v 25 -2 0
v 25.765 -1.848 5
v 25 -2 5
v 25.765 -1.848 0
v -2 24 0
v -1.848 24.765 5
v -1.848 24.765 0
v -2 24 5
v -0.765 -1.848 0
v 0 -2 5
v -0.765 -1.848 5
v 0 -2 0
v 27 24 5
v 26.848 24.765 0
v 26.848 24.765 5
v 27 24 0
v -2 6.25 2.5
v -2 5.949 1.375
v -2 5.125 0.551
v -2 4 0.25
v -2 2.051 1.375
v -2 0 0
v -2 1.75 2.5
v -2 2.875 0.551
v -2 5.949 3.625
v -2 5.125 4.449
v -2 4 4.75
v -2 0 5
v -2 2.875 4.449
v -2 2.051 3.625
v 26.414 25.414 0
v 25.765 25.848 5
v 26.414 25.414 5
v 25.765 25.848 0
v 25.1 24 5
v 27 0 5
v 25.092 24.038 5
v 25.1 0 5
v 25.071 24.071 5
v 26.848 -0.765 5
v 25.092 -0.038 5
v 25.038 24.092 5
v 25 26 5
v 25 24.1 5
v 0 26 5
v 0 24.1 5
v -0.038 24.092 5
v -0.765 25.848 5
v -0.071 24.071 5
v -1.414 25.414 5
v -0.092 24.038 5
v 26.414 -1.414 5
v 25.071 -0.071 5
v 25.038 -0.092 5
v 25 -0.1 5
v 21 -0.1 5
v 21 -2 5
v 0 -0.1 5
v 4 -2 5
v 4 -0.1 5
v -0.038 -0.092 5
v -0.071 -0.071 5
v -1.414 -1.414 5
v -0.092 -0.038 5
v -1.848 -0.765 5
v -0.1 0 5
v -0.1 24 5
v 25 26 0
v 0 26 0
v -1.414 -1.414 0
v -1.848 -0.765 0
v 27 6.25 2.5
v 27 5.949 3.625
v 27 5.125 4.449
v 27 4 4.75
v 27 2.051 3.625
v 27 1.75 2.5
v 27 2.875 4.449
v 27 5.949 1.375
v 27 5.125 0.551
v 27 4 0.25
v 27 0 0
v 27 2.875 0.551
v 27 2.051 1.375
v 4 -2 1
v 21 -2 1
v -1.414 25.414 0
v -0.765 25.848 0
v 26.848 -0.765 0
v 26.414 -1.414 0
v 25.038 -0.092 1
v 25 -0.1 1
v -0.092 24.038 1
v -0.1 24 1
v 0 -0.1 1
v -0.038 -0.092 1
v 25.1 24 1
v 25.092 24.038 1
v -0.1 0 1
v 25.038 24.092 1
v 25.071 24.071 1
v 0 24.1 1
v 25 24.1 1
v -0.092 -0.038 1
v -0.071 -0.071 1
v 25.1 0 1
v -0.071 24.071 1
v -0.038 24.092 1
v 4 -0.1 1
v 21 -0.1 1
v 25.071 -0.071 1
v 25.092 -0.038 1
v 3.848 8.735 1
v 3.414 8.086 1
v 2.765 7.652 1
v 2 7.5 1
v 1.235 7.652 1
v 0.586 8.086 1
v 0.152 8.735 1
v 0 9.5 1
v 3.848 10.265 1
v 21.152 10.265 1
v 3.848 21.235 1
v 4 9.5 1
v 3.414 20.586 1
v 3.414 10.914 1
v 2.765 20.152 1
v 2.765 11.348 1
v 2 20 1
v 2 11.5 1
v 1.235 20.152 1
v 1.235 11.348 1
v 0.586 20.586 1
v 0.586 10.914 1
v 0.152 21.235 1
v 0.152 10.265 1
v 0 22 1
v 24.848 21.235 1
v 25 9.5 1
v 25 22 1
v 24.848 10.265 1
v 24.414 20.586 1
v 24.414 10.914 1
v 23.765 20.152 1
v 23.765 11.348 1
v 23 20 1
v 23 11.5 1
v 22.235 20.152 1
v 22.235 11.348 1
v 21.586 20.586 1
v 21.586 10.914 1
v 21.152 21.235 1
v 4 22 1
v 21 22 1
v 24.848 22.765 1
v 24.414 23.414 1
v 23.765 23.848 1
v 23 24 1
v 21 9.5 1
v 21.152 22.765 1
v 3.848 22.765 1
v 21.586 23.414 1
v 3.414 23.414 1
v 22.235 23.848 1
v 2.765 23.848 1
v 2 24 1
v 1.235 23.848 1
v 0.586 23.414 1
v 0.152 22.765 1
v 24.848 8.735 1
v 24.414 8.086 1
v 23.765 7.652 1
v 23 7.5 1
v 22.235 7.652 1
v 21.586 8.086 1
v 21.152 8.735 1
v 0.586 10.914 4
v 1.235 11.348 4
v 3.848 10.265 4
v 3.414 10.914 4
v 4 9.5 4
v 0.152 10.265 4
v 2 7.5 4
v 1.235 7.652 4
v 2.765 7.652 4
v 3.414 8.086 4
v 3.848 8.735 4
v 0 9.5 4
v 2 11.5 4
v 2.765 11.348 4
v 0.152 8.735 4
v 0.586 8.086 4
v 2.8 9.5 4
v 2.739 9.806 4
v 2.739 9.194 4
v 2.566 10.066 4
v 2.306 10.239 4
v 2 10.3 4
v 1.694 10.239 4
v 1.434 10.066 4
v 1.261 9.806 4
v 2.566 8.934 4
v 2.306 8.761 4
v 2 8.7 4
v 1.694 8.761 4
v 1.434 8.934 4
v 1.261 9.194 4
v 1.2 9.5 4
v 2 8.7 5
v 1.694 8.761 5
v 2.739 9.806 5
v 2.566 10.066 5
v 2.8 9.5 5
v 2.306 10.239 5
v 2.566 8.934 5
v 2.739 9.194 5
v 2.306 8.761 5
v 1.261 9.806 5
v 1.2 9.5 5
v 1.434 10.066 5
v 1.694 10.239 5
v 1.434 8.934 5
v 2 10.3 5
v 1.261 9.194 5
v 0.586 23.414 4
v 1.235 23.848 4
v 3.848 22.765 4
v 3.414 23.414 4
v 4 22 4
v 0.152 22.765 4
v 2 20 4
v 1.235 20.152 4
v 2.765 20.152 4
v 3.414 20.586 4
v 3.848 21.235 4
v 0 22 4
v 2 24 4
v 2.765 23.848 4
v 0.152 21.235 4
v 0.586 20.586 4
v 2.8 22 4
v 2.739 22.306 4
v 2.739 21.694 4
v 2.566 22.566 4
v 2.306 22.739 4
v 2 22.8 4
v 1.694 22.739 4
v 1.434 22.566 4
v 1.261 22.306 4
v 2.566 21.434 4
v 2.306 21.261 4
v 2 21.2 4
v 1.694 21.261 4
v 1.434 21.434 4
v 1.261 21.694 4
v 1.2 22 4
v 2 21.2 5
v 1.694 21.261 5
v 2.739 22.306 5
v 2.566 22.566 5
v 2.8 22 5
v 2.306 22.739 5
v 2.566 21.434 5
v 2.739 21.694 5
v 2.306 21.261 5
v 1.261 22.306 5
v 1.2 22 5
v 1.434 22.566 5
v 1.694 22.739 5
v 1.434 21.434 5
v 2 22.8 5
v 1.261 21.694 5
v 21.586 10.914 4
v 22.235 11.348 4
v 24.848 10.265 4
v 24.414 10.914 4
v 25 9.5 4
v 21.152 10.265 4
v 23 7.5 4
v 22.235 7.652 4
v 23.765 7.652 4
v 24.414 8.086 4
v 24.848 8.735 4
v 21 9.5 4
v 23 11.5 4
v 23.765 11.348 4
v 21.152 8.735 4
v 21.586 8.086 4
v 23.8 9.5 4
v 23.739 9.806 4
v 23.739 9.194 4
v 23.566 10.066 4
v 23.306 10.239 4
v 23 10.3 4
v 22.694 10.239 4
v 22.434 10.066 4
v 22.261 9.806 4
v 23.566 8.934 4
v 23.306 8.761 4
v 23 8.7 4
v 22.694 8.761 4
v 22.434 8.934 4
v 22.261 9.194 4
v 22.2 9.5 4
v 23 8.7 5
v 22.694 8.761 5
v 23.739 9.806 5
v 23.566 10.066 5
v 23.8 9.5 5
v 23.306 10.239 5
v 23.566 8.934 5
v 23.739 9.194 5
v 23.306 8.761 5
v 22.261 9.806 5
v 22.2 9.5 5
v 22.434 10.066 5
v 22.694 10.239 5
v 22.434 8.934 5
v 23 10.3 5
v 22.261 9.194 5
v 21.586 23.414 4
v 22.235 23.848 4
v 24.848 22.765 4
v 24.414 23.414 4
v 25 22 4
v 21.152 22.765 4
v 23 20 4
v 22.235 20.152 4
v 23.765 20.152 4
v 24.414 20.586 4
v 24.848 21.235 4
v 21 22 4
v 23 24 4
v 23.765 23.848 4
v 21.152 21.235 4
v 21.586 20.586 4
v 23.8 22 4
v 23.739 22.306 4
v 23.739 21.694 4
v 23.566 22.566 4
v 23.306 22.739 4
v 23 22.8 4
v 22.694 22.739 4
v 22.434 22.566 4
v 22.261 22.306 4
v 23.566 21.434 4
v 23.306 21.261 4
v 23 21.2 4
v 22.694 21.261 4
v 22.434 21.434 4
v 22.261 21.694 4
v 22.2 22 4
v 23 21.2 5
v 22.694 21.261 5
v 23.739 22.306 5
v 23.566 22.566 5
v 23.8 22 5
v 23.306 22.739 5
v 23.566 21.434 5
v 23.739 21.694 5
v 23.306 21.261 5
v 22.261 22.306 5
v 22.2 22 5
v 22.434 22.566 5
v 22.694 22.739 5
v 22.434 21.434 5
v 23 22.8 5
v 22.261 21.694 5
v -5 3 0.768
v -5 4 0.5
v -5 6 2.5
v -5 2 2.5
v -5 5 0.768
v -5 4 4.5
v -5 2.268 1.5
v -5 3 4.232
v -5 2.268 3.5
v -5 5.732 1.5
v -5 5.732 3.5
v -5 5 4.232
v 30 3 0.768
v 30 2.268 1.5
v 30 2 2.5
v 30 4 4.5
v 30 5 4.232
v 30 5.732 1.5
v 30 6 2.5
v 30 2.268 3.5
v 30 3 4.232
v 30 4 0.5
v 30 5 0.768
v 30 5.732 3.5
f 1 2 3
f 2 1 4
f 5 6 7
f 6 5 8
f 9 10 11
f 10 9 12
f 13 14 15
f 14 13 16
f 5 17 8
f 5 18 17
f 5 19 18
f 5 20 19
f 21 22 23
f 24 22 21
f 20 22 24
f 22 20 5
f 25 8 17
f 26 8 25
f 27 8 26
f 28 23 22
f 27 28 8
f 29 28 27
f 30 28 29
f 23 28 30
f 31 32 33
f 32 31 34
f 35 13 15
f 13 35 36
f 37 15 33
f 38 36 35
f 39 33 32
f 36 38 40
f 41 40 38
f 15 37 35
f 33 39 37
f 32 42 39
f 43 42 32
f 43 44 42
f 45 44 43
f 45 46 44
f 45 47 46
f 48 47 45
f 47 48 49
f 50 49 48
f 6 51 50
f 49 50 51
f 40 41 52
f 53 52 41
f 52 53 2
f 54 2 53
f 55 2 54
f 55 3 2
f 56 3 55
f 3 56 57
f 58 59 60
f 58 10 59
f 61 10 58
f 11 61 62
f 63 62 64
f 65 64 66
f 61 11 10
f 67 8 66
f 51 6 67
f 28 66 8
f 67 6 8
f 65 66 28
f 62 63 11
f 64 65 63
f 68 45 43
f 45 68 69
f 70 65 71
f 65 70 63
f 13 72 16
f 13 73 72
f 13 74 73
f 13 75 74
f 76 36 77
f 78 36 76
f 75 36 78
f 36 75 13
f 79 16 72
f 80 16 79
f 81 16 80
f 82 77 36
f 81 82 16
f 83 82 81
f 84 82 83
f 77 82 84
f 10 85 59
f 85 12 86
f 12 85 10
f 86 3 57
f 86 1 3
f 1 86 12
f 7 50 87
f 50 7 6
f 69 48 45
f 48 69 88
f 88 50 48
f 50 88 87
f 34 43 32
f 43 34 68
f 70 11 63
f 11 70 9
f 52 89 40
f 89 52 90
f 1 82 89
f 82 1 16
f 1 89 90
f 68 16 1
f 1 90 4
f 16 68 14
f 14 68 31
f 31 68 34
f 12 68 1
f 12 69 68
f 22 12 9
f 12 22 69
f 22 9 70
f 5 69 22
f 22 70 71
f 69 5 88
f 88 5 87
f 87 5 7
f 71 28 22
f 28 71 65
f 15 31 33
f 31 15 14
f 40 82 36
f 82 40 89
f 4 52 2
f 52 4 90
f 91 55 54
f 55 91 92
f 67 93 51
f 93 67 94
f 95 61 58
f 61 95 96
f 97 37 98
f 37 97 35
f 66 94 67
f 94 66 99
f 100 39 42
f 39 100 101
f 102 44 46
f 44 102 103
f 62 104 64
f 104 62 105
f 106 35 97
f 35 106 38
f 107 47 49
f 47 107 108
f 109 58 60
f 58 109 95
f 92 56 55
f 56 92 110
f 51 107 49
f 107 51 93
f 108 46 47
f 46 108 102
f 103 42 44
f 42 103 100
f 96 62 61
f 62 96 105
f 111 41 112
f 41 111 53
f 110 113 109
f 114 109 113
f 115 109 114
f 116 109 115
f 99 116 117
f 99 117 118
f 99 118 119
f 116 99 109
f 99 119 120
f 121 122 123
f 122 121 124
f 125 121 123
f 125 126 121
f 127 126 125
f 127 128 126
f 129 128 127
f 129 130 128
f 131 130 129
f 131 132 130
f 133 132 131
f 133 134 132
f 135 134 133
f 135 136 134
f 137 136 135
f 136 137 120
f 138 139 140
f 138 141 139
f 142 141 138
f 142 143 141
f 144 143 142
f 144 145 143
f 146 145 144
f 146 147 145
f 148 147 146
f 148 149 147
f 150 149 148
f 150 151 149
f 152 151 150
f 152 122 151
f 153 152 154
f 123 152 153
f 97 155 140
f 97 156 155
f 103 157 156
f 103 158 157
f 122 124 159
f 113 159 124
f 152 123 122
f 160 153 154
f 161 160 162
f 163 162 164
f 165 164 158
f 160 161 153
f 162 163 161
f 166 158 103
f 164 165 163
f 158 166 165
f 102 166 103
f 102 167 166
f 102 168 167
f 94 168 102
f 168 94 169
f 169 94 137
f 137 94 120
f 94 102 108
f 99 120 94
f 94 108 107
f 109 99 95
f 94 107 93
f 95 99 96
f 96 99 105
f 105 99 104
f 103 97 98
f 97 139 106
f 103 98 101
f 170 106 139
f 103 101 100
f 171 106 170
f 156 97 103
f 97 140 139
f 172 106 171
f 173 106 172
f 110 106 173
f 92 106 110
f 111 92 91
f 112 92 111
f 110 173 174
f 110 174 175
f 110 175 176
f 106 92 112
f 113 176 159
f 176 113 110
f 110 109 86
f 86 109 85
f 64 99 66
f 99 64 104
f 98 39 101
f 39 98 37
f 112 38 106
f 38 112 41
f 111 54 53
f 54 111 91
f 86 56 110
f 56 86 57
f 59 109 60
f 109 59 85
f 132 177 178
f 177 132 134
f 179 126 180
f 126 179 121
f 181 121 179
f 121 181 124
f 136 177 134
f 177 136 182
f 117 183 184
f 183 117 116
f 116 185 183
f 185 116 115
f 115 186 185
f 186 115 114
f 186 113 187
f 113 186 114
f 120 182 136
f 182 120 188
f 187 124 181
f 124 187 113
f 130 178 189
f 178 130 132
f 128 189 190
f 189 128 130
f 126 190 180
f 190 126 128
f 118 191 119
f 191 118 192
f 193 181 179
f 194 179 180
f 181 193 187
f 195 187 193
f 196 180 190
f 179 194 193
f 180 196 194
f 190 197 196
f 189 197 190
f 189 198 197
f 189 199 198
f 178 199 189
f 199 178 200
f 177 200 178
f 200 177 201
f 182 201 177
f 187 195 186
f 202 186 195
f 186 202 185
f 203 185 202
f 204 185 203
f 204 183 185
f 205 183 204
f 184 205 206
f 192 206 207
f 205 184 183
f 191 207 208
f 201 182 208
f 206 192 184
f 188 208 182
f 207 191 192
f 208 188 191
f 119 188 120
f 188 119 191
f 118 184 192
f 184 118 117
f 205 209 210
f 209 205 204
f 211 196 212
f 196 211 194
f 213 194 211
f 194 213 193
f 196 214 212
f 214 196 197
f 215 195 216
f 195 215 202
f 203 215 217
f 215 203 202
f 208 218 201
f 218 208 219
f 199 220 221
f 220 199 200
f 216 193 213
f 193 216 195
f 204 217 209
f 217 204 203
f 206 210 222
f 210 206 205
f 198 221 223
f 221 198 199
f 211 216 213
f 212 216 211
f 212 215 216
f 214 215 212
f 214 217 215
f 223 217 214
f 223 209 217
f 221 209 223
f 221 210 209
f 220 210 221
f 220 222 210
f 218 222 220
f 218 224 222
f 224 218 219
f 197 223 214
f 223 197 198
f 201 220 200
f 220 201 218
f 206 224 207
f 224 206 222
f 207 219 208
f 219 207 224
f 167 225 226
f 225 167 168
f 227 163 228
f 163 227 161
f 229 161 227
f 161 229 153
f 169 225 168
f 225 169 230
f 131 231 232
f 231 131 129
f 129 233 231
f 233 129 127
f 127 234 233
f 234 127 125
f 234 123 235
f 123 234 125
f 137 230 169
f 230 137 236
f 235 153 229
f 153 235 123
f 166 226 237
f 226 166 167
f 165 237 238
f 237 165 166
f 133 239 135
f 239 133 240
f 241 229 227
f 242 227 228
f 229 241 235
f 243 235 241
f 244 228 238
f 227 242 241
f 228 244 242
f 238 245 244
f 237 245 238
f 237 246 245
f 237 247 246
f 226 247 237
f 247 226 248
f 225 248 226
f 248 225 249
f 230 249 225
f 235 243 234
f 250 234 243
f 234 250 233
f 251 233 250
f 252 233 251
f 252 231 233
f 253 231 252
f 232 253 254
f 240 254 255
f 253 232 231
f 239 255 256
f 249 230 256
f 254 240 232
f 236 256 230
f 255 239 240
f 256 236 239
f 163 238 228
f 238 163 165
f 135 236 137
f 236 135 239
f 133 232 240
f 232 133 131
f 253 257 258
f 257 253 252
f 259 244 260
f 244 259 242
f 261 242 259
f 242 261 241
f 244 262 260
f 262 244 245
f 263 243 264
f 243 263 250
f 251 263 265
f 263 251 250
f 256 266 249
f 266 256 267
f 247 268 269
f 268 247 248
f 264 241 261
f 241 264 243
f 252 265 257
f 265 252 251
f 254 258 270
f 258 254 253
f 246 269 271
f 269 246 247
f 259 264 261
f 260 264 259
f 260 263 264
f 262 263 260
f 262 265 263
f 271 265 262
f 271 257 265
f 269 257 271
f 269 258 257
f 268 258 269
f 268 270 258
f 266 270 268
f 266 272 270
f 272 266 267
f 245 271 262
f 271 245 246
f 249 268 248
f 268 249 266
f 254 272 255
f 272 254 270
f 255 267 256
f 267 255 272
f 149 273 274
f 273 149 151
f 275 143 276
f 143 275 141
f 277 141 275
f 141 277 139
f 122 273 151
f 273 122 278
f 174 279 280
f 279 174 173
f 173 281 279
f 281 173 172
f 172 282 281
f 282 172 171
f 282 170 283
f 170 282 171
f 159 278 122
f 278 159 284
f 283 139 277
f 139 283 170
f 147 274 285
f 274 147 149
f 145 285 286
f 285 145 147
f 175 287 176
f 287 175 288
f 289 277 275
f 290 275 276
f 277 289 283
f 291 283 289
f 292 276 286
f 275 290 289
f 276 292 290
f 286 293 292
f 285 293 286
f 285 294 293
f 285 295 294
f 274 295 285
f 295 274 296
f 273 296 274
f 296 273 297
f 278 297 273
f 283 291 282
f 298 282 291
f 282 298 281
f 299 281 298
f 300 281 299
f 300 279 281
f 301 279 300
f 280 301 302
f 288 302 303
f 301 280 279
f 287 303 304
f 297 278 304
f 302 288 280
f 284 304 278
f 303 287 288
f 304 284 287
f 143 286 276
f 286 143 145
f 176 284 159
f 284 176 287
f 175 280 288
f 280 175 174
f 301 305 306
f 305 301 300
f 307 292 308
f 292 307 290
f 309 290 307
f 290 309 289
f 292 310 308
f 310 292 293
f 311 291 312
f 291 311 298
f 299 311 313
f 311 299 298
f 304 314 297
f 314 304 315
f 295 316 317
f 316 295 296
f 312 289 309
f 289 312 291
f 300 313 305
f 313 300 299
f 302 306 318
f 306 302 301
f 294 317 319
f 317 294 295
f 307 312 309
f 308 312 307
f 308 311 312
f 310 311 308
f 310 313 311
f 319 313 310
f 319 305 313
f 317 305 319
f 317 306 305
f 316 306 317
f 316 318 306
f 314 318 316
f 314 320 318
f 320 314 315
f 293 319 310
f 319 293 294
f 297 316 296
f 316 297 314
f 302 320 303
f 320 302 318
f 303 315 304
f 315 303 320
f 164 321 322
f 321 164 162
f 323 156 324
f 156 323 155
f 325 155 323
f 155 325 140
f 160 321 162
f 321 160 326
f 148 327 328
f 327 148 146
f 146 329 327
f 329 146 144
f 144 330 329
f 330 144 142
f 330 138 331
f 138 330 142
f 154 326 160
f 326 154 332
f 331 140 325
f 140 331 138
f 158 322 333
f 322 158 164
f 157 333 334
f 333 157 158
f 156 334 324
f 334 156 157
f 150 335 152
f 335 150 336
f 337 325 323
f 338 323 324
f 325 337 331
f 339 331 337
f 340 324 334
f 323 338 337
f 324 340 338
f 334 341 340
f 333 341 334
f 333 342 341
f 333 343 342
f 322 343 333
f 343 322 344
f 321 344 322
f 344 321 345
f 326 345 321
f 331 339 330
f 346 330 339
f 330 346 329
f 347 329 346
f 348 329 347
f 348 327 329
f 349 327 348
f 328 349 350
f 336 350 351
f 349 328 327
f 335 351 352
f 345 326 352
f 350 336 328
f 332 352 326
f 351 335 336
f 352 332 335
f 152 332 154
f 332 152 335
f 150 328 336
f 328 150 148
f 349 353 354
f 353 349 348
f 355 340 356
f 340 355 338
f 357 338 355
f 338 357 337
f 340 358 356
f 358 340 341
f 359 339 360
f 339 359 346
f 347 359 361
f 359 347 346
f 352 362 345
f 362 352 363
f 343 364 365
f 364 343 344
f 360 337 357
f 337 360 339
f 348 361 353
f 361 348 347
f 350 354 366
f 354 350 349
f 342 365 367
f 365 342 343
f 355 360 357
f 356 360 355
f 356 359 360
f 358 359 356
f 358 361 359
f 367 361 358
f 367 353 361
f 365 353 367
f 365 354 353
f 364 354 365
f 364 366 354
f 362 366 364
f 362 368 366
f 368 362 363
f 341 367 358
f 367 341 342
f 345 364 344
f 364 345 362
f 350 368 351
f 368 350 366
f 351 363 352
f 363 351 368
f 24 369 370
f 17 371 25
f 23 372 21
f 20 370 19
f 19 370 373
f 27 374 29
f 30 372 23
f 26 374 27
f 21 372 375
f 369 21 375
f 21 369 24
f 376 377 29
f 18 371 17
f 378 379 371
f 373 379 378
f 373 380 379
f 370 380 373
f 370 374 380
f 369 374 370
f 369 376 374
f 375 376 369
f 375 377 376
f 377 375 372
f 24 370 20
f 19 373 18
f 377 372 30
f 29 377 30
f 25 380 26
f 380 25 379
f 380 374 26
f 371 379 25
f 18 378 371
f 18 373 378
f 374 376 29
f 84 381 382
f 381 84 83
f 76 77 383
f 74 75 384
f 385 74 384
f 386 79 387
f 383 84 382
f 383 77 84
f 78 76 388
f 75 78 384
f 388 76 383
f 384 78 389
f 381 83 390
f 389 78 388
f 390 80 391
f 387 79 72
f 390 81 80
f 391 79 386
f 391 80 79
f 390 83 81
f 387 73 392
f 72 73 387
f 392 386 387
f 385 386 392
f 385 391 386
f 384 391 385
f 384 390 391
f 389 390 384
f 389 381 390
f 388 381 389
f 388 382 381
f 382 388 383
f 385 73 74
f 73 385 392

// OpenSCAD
// Mcam1a.scad
// This is the back for the camera



module shell(){
    
// main shell
difference(){
    color("yellow")
    linear_extrude(height=5)
    offset(r=2,$fn=16)    
    square(size=[25,24]);

    translate([0,0,1])
    color("orange")
    linear_extrude(height=5)
    offset(r=0.1,$fn=16)    
    square(size=[25,24]);

    translate([4,-3,1])
    color("green")
    cube([17,5,5]);

}

// posts to support PCB
translate([2.0,9.5,1]){
    cylinder(r=2,h=3,$fn=16);
    cylinder(r=0.8,h=4,$fn=16);
}
translate([2.0,22,1]){
    cylinder(r=2,h=3,$fn=16);
    cylinder(r=0.8,h=4,$fn=16);
}
translate([23.0,9.5,1]){
    cylinder(r=2,h=3,$fn=16);
    cylinder(r=0.8,h=4,$fn=16);
}
translate([23.0,22,1]){
    cylinder(r=2,h=3,$fn=16);
    cylinder(r=0.8,h=4,$fn=16);
}

// pivots on sides to mount
translate([-5,4,2.5])
color("pink")
rotate([0,90,0])
cylinder(r1=2,r2=2.25,h=3,$fn=12);

translate([30,4,2.5])
color("pink")
rotate([0,-90,0])
cylinder(r1=2,r2=2.25,h=3,$fn=12);


} // end module shell

shell();
